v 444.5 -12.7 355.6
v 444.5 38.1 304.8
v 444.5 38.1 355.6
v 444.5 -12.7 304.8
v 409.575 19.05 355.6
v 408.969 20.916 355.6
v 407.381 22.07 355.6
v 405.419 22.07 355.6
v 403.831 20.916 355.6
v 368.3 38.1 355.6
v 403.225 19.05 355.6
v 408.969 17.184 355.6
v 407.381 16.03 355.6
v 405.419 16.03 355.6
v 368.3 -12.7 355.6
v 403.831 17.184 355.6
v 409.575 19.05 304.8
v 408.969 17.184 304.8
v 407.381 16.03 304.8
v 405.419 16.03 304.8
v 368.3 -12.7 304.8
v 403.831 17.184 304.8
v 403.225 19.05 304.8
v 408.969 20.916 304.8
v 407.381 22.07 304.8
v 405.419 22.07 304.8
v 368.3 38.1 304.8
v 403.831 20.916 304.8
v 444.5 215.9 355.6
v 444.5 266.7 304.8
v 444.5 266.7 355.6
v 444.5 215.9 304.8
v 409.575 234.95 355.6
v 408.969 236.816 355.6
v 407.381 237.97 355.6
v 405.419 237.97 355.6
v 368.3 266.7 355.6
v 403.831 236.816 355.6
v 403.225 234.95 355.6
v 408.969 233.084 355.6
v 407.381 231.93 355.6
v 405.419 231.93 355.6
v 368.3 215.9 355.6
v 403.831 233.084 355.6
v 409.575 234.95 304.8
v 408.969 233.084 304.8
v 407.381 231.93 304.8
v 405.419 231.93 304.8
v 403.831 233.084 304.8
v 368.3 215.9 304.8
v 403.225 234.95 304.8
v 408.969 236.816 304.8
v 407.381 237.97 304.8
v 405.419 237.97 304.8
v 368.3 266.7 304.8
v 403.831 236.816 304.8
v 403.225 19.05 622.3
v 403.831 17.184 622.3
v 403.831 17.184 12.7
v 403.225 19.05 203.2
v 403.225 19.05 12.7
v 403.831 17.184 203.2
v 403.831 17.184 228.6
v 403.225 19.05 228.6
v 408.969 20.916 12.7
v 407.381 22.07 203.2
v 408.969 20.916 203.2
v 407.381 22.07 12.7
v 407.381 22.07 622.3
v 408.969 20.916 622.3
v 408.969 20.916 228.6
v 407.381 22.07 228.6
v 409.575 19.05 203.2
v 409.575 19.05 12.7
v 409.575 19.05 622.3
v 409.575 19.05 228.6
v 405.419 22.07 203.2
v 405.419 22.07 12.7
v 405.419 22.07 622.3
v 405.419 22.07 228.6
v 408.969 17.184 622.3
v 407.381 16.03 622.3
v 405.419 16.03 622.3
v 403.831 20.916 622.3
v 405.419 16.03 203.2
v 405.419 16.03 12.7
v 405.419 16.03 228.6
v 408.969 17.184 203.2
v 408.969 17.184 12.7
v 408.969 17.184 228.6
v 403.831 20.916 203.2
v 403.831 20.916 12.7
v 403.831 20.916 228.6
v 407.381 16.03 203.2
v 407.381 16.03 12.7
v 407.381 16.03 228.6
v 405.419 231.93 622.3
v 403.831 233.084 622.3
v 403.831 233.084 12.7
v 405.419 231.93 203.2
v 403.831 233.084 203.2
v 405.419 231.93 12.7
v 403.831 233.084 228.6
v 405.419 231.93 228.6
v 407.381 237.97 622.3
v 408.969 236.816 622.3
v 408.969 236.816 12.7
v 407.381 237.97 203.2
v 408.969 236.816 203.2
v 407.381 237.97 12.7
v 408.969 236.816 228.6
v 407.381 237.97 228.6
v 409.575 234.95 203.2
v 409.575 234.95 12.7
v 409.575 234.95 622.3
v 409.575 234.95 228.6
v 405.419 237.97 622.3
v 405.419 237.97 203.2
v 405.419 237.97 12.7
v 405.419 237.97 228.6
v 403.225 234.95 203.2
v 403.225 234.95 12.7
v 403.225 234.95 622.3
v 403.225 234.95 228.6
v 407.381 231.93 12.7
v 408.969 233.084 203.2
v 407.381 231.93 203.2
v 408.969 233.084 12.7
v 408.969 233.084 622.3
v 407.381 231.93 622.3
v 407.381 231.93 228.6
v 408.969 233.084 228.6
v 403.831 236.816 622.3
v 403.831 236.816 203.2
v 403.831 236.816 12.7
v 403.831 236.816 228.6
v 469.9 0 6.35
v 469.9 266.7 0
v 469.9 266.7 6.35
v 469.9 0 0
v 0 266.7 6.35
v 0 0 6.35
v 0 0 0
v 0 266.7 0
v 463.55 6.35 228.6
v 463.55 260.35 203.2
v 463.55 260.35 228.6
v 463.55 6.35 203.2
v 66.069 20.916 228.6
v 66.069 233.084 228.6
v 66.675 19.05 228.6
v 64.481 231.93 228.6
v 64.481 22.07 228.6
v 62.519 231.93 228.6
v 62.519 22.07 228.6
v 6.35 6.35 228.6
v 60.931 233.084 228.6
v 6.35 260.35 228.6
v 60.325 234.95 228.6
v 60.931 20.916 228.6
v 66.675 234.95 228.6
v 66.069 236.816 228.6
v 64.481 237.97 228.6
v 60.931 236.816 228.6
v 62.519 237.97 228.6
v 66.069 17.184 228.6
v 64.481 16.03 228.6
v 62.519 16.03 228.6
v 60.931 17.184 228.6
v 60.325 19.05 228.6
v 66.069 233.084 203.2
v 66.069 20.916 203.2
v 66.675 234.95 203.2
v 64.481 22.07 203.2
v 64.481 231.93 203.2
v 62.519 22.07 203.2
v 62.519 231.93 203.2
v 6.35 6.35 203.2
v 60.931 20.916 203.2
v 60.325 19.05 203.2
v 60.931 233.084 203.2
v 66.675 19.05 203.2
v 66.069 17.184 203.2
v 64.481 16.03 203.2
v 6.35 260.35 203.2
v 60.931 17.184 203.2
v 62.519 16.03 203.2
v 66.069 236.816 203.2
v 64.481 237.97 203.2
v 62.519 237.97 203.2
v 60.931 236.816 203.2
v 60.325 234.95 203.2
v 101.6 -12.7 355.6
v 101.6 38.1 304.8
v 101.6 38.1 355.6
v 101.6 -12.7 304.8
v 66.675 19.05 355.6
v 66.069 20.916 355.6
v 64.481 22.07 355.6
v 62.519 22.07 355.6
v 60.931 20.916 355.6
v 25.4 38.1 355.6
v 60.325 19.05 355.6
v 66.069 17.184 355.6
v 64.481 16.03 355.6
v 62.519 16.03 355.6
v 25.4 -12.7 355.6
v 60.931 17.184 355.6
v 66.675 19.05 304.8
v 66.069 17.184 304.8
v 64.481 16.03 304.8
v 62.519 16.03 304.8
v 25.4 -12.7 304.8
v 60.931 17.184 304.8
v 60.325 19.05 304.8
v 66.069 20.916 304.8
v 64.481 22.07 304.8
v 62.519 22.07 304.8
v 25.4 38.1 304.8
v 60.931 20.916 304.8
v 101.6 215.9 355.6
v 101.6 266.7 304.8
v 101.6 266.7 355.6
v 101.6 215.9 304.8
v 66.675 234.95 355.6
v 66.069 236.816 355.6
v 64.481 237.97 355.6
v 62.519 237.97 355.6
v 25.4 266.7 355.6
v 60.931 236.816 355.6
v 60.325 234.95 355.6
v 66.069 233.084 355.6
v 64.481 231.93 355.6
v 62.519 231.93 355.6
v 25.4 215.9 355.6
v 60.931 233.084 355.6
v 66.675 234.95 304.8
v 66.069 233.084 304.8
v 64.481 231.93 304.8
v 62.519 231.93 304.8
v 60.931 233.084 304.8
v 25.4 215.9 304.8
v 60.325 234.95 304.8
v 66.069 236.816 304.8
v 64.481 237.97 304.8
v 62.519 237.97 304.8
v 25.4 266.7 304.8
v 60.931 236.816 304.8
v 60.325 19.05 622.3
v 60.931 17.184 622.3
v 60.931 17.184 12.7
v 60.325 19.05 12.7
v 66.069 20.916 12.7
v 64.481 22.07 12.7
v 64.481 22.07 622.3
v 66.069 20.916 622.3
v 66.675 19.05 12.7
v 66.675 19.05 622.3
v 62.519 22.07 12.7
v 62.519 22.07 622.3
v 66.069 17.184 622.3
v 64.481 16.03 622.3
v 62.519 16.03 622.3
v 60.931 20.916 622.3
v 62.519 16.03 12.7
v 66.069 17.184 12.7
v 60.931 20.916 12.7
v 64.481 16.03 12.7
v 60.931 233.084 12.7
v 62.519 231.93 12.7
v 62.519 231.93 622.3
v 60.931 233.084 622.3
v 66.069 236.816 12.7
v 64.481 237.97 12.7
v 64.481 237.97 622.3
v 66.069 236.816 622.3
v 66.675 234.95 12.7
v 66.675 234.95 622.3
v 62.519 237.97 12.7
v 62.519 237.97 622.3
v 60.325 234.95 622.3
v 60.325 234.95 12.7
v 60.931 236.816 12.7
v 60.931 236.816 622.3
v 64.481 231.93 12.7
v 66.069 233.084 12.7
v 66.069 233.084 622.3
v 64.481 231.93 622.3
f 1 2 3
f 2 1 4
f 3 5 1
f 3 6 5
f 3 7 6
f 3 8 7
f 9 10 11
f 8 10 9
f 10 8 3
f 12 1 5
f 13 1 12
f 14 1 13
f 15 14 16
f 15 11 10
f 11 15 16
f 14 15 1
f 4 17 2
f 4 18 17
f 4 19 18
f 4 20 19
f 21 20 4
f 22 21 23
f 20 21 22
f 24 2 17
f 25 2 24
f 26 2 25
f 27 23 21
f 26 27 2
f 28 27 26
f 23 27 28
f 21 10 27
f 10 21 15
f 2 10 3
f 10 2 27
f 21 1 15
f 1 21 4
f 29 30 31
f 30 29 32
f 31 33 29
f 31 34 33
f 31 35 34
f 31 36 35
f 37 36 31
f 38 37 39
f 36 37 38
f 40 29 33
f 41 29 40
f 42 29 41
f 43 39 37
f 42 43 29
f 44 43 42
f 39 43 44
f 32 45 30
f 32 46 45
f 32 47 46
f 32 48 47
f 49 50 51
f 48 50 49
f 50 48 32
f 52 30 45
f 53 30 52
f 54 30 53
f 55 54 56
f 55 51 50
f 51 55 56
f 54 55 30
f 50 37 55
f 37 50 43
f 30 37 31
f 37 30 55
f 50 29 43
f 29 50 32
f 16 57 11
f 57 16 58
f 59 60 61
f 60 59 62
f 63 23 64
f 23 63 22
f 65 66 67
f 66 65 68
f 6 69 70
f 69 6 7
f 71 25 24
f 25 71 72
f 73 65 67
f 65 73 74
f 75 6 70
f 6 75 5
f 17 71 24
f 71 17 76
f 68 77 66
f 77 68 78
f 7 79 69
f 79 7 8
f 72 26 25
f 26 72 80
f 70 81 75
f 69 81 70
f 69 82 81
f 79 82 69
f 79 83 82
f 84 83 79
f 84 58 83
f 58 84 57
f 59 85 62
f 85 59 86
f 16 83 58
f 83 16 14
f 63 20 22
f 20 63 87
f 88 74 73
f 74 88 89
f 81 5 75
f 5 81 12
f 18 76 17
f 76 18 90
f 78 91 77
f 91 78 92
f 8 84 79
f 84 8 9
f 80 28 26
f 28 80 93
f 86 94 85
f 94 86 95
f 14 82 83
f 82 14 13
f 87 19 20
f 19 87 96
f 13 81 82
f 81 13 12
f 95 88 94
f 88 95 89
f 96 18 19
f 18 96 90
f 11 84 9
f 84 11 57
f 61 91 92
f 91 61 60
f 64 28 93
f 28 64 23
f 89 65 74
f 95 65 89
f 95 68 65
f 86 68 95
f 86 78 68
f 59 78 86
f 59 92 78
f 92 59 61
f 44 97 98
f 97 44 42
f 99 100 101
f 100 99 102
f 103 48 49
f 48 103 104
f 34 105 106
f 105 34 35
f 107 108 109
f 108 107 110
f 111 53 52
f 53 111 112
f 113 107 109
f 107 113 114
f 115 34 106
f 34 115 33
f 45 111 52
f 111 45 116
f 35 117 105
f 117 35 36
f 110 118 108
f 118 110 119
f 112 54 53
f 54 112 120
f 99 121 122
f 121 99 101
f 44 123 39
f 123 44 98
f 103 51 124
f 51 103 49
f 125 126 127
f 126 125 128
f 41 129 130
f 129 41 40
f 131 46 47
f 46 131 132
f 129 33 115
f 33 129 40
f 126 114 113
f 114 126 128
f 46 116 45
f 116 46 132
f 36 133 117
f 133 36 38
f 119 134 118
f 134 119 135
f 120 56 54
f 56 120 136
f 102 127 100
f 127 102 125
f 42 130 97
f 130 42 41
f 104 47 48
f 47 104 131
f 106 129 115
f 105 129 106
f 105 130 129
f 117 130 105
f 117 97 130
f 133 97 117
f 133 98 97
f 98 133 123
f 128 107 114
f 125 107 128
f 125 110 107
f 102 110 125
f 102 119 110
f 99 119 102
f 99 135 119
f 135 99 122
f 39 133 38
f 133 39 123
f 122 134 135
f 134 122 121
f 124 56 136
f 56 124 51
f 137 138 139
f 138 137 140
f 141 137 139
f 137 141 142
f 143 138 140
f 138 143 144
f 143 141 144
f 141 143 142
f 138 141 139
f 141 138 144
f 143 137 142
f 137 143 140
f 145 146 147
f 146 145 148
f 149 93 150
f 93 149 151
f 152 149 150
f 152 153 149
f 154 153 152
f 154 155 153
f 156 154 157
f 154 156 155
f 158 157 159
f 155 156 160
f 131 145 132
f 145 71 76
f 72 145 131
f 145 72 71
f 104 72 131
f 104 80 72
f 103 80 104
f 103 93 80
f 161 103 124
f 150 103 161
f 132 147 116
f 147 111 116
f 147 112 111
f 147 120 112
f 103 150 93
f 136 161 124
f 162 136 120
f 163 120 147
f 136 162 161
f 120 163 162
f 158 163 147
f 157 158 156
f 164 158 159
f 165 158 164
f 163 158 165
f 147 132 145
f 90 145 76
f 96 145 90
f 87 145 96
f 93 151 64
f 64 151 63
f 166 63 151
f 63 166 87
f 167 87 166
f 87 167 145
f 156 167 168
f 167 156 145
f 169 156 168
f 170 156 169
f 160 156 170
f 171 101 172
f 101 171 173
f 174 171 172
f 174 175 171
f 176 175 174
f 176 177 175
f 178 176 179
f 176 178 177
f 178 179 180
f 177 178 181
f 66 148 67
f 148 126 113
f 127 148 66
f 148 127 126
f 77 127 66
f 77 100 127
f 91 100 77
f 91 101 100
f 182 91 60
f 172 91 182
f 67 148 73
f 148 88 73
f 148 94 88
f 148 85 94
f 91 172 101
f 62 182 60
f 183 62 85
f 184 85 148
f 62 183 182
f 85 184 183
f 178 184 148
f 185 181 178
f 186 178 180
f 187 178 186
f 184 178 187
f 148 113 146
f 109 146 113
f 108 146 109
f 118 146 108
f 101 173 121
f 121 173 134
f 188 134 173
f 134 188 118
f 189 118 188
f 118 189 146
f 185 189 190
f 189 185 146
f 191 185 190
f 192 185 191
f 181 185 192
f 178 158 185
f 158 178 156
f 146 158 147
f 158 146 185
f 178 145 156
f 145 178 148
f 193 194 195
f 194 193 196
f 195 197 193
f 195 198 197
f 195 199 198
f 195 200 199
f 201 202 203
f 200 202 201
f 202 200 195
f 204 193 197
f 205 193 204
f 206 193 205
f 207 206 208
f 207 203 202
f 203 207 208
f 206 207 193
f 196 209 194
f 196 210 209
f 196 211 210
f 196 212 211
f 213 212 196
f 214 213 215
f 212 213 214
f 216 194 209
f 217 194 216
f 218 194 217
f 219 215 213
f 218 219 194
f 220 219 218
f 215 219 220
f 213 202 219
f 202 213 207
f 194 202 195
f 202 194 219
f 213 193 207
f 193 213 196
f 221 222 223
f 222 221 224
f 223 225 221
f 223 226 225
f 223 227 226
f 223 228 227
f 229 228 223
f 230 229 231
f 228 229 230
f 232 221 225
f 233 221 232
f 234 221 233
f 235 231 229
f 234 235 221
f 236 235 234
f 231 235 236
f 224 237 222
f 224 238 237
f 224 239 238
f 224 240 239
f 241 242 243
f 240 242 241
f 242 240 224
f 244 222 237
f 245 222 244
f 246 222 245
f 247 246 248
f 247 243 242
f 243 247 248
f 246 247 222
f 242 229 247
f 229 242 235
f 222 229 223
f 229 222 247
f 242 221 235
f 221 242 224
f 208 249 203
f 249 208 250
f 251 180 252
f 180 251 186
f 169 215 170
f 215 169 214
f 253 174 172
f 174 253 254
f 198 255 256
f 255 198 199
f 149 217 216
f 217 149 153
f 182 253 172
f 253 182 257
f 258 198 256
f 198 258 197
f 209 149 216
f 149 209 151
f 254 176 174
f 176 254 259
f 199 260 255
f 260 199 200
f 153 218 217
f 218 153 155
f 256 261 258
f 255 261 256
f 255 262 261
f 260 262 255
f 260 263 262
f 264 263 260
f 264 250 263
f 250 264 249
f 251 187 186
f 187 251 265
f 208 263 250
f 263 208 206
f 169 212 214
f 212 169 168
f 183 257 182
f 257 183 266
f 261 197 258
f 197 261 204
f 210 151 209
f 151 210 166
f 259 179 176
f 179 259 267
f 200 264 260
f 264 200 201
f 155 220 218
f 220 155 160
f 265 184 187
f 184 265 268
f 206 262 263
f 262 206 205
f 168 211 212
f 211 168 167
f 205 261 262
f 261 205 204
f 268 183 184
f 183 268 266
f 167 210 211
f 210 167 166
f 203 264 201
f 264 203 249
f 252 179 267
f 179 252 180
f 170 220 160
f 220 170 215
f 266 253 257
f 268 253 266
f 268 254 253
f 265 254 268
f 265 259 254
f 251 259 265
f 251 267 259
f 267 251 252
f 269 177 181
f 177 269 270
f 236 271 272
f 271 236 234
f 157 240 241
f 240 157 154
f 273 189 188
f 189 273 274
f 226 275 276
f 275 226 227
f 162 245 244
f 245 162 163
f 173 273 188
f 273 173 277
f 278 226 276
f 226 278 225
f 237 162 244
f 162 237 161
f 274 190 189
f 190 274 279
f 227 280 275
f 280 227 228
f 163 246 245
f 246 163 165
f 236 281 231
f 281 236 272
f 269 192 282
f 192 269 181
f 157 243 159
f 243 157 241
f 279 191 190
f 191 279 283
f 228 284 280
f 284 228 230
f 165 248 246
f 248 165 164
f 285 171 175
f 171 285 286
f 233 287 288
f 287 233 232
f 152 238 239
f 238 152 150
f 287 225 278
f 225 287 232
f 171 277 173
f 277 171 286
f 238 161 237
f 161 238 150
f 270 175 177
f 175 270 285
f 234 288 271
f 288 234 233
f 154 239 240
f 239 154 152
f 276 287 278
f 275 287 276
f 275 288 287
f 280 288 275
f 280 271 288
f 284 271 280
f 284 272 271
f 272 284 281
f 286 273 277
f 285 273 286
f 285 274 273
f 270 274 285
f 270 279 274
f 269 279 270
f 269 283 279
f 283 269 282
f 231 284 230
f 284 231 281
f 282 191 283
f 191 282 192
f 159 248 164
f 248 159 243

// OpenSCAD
// Aquarium
cube([18.5*25.4, 10.5*25.4, 0.25*25.4]);
%color([0.7, 0.9, 0.9, 0.3]) {
    cube([18.5*25.4, 0.25*25.4, 13*25.4]);
    translate([0, (10.5-0.25)*25.4, 0]) cube([18.5*25.4, 0.25*25.4, 13*25.4]);
    cube([0.25*25.4, 10.5*25.4, 13*25.4]);
    translate([(18.5-0.25)*25.4, 0, 0]) cube([0.25*25.4, 10.5*25.4, 13*25.4]);
}

// Resin floating on salt water
color([0.3, 0.9, 0.5]) {
    translate([0.25*25.4, 0.25*25.4, 8*25.4]) cube([18.0*25.4, 10.0*25.4, 1*25.4]);
}

module baseblock() {
    color([1, 0, 0]) {
        translate([1*25.4, -0.5*25.4, (13-1)*25.4])
        cube([3*25.4, 2*25.4, 2*25.4]);
    }
}

baseblock();
translate([0, (10.5-1.5)*25.4, 0]) baseblock();
translate([13.5*25.4, 0, 0]) {
    baseblock();
    translate([0, (10.5-1.5)*25.4, 0]) baseblock();
}

module threadedrod(L) {
    color([0, 0, 1]) {
        cylinder(d=0.25*25.4, h=L);
    }
}

translate([2.5*25.4, 0.75*25.4, 0.5*25.4])
    threadedrod(24*25.4);
translate([2.5*25.4, (10-0.75)*25.4, 0.5*25.4])
    threadedrod(24*25.4);
translate([13.5*25.4, 0, 0]) {
    translate([2.5*25.4, 0.75*25.4, 0.5*25.4])
        threadedrod(24*25.4);
    translate([2.5*25.4, (10-0.75)*25.4, 0.5*25.4])
        threadedrod(24*25.4);
}
